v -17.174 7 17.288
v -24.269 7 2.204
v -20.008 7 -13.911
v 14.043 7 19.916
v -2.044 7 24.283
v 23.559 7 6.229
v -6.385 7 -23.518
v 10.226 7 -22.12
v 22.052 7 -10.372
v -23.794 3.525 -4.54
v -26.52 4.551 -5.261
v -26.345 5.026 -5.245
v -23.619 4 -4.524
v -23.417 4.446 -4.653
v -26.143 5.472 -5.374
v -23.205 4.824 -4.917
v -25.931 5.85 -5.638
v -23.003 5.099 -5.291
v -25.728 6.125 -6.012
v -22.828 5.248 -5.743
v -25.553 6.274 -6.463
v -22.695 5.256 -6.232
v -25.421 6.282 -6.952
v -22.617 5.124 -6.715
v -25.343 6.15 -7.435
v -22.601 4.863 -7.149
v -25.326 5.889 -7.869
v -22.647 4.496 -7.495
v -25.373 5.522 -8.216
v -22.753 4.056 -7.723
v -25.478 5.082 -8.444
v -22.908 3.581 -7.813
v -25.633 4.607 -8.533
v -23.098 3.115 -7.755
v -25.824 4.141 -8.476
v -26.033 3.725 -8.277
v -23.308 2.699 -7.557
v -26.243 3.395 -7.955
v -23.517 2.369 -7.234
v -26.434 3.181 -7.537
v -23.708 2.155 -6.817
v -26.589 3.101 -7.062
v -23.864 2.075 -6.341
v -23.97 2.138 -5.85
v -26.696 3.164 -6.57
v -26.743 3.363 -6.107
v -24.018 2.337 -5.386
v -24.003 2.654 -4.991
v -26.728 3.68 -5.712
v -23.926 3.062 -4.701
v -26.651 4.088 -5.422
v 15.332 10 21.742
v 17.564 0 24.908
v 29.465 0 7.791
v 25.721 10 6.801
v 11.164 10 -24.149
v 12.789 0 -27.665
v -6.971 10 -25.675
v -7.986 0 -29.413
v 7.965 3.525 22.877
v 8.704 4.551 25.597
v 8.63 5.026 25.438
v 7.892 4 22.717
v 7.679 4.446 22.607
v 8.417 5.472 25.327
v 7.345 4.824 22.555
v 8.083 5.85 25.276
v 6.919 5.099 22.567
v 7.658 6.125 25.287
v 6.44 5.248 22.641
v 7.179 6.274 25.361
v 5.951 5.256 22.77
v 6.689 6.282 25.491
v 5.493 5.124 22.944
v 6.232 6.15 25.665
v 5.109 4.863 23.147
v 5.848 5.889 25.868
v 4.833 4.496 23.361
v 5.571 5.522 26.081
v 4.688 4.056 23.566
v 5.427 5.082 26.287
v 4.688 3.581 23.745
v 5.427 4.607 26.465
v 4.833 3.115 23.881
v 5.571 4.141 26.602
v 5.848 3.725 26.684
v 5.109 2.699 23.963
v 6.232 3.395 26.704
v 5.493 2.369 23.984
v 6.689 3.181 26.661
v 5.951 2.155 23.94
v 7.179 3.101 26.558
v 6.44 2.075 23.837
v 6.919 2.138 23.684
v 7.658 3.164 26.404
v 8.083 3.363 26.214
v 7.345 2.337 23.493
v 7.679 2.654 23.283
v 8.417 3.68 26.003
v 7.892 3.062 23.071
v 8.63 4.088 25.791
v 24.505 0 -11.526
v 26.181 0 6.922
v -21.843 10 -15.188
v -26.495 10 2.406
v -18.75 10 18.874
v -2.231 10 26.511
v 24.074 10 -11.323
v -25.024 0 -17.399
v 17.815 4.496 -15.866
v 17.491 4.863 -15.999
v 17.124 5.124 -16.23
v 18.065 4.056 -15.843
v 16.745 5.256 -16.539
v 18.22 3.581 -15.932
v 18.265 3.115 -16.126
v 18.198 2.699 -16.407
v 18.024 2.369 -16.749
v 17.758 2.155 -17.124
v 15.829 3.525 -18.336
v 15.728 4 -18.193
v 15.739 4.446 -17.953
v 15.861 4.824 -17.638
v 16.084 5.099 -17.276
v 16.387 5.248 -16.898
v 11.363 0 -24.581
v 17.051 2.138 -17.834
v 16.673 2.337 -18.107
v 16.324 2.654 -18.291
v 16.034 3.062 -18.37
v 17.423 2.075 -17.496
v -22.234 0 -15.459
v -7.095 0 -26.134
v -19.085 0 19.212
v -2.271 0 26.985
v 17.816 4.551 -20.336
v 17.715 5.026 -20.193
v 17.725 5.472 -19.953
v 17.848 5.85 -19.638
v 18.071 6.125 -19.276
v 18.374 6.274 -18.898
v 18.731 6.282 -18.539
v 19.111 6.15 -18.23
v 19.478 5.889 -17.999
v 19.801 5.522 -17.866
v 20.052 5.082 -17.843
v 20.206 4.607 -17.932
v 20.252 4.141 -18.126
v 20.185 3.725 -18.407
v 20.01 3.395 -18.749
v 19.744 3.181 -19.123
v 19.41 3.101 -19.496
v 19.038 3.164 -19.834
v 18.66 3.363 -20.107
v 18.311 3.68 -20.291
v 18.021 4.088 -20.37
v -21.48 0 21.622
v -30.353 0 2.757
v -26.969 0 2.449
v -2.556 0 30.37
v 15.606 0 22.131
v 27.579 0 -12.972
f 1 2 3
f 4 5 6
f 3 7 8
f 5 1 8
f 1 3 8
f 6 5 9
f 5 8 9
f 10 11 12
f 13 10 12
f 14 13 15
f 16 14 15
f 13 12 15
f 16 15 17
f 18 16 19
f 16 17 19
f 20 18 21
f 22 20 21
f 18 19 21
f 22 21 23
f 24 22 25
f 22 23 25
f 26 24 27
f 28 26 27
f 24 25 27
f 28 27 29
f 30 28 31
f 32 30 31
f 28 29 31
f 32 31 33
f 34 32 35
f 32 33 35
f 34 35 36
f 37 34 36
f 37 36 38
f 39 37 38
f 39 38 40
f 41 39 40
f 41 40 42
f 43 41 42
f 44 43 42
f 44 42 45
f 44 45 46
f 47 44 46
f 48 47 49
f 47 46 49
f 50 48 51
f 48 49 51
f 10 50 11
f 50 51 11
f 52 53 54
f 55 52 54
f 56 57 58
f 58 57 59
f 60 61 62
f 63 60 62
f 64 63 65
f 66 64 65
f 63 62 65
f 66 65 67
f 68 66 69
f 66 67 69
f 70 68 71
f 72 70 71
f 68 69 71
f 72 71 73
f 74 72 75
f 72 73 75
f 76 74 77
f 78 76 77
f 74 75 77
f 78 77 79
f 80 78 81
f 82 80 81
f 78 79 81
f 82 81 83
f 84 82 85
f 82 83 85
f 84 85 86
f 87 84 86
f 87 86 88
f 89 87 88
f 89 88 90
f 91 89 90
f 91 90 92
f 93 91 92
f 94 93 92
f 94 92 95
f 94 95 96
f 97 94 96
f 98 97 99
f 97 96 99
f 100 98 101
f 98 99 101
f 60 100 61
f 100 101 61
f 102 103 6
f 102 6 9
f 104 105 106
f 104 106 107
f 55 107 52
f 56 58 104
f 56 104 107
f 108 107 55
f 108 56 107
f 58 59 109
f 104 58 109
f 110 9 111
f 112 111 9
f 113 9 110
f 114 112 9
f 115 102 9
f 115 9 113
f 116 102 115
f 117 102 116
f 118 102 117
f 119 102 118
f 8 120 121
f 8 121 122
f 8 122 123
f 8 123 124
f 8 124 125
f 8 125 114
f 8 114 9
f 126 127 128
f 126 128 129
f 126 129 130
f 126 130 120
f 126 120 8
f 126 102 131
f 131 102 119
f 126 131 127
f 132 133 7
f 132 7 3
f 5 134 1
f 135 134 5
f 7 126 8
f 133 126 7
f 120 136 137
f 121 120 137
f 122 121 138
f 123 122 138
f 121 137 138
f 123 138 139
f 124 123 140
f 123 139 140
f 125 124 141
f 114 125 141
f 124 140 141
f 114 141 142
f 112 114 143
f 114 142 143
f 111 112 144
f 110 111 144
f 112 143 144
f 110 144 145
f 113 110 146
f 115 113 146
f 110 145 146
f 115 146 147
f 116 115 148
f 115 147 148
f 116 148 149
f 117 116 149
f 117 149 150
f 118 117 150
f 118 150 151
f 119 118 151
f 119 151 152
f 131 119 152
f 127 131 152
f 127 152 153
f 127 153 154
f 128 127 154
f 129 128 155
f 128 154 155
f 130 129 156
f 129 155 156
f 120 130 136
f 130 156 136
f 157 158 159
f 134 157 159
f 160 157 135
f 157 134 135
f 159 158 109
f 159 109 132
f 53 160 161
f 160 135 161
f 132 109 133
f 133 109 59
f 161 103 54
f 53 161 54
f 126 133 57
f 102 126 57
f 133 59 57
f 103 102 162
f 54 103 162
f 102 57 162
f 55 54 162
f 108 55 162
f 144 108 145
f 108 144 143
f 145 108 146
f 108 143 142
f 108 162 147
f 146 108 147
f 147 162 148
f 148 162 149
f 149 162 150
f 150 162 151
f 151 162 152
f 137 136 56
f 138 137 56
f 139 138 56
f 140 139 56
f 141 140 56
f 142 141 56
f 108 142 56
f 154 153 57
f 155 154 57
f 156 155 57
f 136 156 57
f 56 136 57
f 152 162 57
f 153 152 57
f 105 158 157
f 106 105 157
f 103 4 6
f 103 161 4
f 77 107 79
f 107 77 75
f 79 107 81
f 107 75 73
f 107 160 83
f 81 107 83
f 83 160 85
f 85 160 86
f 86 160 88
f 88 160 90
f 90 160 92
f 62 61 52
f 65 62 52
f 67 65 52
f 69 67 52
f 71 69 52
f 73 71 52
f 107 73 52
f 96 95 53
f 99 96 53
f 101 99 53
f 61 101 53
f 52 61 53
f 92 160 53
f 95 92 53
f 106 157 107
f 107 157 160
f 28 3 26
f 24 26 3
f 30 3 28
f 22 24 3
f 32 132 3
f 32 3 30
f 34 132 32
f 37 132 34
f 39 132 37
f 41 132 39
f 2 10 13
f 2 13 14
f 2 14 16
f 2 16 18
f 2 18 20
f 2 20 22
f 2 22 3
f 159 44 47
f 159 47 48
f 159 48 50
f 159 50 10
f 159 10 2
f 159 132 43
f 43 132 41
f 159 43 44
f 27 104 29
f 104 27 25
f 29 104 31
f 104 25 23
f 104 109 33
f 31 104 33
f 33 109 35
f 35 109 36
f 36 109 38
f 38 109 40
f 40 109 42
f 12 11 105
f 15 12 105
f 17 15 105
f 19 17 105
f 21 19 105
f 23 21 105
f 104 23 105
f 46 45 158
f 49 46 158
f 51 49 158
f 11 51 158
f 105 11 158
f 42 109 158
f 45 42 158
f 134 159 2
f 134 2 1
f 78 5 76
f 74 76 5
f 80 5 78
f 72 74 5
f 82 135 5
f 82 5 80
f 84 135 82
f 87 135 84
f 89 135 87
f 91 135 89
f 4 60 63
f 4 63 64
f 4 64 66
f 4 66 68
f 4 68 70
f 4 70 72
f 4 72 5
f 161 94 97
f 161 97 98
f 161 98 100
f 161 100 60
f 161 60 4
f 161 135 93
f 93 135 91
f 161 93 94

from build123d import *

# Parameters (mm, degrees)
BOSS_EXTRUDE1_DEPTH = 10
DRAFT1_ANGLE        = 20
SHELL1_T            = -3
SKETCH3_R           = 1.7
CUT_EXTRUDE1_DEPTH  = 3
CIRPATTERN1_COUNT   = 3


with BuildPart() as part:
    # Sketch2 → Boss-Extrude1 (new body)
    with BuildSketch(Plane(origin=(0, 0, 0), x_dir=(1, 0, 0), z_dir=(0, 1, 0))):
        Polygon((25.720557456, -6.800689768), (24.074489233, 11.323225041), (11.16369994, 24.148877009), (-6.970708626, 25.67500104), (-21.843445154, 15.187506739), (-26.495390933, -2.406390756), (-18.74984883, -18.874311272), (-2.231044079, -26.510731779), (15.331690993, -21.742486253), align=None)
    extrude(amount=BOSS_EXTRUDE1_DEPTH)

    # Draft1
    draft1_faces = [part.faces().sort_by_distance(p)[0] for p in [
        (-24.169418044, 5, -6.390557991),
        (-14.40707689, 5, -20.431253889),
        (2.096495657, 5, -24.911939024),
        (17.619094586, 5, -17.736051025),
        (24.897523344, 5, -2.261267636),
        (20.526124224, 5, 14.27158801),
        (-10.490446454, 5, 22.692521526),
        (-22.622619881, 5, 10.640351014),
        (6.550323457, 5, 24.126609016),
    ]]
    draft(draft1_faces, Plane.ZX.offset(10), DRAFT1_ANGLE)

    # Shell1
    shell1_openings = [part.faces().sort_by_distance(p)[0] for p in [
        (0, 0, 0),
    ]]
    offset(amount=SHELL1_T, openings=shell1_openings, kind=Kind.INTERSECTION)

    # Sketch3 → Cut-Extrude1 (cut)
    with BuildSketch(Plane(origin=(6.626174522, 9.204622905, 24.40598896), x_dir=(0.969216093, -0.086883963, -0.23037218), z_dir=(0.246211625, 0.342020143, 0.906863858))):
        with Locations((0.443378447, -4.774813723)):
            Circle(SKETCH3_R)
    cut_extrude1 = extrude(amount=-CUT_EXTRUDE1_DEPTH, mode=Mode.SUBTRACT)

    # CirPattern1: Cut-Extrude1 ×3 about axis
    cirpattern1_axis = Axis((0, 10, 0), (0, 1, 0))
    for i in range(1, CIRPATTERN1_COUNT):
        add(cut_extrude1.rotate(cirpattern1_axis, i * 360 / CIRPATTERN1_COUNT), mode=Mode.SUBTRACT)


solid = part.part
